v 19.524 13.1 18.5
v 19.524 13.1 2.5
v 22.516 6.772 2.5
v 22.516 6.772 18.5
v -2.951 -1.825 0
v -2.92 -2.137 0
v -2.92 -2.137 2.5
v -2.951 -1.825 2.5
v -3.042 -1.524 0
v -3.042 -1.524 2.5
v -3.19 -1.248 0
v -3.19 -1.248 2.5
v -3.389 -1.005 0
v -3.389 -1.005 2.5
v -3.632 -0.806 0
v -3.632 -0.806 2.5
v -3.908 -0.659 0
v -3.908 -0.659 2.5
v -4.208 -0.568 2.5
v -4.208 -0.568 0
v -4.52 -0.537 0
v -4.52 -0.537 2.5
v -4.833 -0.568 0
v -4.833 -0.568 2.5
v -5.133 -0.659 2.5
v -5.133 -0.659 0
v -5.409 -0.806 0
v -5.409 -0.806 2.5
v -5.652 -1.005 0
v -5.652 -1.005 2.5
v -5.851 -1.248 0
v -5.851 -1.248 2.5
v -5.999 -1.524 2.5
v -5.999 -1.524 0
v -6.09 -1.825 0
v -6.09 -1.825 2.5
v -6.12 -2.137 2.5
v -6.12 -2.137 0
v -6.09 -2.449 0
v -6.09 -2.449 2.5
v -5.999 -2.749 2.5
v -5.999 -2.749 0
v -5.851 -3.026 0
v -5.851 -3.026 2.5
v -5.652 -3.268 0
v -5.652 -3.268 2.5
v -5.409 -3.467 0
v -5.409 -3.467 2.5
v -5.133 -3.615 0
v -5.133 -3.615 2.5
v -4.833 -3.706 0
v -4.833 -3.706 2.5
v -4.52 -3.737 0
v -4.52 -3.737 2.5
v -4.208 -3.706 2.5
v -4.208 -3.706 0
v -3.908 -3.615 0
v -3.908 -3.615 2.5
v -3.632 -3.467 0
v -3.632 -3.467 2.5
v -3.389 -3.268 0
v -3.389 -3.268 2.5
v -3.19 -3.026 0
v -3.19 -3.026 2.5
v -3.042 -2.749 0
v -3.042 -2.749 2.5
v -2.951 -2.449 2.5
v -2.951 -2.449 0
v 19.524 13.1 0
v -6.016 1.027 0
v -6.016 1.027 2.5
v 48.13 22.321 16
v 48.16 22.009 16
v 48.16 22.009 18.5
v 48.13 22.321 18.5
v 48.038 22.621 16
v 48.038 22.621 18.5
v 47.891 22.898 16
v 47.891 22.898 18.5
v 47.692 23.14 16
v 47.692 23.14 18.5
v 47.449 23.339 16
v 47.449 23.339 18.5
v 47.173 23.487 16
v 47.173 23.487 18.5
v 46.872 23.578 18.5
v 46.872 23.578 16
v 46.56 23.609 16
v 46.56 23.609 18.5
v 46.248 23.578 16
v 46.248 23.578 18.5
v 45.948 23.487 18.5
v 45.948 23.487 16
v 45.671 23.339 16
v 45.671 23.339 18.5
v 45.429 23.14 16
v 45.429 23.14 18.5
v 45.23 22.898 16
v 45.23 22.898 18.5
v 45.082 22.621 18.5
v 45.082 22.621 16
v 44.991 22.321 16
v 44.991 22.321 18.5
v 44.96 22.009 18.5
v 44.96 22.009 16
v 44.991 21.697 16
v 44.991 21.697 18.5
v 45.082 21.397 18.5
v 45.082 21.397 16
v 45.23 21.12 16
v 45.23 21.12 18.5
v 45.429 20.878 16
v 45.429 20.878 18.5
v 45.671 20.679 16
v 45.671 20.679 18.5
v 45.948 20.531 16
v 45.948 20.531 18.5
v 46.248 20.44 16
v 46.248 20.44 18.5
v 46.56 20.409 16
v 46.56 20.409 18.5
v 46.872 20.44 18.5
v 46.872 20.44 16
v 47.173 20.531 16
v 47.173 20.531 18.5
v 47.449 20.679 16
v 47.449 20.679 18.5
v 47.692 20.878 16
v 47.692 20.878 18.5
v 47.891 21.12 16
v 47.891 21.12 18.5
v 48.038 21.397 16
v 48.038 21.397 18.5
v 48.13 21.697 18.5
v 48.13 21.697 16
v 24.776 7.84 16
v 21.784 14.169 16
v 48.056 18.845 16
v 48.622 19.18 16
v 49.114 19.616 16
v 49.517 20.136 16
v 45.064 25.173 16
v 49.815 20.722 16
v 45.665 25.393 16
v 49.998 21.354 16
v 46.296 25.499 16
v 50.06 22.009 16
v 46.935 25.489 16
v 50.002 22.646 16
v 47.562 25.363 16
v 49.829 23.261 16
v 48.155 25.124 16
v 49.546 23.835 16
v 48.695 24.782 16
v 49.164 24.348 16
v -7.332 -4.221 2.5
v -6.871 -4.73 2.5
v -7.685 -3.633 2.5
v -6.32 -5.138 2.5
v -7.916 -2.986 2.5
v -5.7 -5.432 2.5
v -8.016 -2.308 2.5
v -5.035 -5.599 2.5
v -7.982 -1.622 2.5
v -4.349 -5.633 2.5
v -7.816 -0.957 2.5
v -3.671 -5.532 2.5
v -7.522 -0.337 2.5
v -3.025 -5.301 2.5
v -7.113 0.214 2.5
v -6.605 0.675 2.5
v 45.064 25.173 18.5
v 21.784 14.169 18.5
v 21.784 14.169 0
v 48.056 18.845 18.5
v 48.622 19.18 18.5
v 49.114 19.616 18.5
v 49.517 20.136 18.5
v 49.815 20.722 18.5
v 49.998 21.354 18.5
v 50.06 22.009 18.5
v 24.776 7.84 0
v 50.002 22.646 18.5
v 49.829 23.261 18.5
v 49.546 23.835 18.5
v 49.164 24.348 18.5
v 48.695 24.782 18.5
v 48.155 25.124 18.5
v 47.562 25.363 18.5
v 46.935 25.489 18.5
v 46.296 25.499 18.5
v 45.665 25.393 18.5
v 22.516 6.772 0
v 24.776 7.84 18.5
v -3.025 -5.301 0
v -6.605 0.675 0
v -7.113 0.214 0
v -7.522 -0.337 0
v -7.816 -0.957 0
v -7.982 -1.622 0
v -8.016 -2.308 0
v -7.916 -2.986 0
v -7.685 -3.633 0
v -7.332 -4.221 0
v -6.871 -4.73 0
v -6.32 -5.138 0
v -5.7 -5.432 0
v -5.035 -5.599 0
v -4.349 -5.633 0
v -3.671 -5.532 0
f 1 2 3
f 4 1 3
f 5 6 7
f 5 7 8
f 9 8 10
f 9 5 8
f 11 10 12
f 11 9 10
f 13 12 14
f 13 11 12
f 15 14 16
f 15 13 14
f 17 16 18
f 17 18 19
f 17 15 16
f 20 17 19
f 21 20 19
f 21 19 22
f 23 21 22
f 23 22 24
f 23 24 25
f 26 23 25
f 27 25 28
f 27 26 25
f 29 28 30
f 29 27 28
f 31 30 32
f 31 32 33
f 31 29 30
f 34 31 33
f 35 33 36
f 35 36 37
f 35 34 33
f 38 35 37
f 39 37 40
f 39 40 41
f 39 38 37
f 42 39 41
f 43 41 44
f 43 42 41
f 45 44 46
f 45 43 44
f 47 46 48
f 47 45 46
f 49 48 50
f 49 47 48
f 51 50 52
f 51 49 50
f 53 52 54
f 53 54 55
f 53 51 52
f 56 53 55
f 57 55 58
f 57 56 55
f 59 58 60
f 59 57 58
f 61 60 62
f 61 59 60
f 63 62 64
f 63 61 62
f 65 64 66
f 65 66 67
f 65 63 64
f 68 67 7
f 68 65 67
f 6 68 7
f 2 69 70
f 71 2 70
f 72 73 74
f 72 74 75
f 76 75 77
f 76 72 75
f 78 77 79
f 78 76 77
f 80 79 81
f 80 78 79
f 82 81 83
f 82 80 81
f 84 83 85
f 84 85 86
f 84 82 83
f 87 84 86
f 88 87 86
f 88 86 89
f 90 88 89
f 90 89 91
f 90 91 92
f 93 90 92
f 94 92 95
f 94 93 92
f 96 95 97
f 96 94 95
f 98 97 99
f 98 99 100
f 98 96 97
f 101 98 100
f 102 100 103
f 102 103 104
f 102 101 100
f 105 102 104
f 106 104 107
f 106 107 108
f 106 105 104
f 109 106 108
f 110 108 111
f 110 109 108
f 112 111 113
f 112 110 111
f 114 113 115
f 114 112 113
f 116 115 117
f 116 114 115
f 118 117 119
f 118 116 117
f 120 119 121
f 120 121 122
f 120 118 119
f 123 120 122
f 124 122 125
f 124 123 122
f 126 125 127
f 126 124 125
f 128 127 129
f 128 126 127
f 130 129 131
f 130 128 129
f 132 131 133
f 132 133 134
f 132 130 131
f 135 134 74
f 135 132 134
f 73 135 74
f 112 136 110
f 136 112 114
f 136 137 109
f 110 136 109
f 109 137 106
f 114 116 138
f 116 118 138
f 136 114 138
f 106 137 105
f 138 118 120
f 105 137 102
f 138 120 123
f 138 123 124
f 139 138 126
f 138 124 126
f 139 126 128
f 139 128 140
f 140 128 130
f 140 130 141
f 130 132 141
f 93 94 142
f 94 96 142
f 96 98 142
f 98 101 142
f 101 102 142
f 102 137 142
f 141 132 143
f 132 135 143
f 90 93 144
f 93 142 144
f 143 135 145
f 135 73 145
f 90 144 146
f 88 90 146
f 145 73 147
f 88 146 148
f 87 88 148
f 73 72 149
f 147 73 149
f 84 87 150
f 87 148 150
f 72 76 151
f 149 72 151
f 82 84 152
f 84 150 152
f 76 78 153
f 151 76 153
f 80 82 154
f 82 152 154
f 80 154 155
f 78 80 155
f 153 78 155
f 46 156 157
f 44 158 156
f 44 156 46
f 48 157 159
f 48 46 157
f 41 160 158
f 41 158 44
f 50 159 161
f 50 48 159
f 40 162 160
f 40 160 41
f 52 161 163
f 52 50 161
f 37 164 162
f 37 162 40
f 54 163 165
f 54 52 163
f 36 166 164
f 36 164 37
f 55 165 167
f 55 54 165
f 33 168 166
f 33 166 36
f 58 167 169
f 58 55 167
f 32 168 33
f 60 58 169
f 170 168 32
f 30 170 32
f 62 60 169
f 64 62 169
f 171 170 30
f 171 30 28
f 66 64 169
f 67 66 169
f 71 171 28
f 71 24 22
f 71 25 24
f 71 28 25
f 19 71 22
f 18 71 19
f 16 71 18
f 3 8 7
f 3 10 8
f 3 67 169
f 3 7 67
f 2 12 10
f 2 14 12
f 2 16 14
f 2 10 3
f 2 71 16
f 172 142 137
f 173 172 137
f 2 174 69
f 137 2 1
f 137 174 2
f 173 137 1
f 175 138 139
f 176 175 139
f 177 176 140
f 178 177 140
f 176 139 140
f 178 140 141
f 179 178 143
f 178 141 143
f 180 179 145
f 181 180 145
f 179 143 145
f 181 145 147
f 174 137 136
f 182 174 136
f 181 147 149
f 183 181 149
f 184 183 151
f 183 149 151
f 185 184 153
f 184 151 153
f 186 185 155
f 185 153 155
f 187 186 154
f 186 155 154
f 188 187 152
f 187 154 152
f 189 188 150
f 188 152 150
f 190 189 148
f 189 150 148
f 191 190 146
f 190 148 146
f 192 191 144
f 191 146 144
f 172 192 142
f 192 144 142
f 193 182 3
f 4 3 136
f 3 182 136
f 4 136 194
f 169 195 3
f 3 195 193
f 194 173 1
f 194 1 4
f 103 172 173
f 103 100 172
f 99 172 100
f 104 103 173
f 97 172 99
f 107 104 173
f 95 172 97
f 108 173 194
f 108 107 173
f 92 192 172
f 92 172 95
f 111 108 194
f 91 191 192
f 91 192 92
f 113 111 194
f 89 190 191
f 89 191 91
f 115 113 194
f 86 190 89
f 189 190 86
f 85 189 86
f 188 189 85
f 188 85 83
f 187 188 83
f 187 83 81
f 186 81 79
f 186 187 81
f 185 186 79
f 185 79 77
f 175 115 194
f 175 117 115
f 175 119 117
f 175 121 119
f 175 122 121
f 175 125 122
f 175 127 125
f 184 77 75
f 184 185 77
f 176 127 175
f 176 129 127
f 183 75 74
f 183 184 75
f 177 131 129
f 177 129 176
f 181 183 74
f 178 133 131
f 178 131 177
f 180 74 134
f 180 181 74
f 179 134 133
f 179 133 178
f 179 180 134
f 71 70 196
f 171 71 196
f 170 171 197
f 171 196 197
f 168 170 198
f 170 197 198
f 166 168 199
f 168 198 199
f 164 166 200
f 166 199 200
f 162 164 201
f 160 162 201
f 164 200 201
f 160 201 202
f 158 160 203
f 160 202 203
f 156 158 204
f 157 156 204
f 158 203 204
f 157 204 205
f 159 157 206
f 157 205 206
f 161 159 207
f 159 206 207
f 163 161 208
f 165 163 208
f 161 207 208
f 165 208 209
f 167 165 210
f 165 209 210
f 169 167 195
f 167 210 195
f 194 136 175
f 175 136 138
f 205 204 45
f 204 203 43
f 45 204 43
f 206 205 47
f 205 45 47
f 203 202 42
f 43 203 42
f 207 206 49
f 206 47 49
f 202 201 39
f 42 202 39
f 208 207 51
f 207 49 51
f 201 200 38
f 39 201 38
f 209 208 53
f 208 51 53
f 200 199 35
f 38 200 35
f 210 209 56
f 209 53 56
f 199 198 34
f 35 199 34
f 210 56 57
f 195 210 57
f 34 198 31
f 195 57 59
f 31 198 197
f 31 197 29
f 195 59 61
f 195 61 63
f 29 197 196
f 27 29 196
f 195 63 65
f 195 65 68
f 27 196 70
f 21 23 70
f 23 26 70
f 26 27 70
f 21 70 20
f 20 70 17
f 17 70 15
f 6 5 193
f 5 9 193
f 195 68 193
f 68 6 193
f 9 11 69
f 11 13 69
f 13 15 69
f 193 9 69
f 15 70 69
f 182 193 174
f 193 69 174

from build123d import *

# Parameters (mm, degrees)
F1_R     = 1.6
F2_DEPTH = 2.5
F3_W     = 7
F3_H     = 18.5
F4_DEPTH = 2.5
F5_R     = 1.6
F6_DEPTH = 2.5


with BuildPart() as f2:
    # F1 (on offset) → F2 (new body)
    with BuildSketch(Plane.XY.offset(16)):
        with BuildLine():
            ThreePointArc((48.0560038294, 18.8446410406), (49.5170345112, 20.1361157487), (50.0602513075, 22.0089299644))
            ThreePointArc((50.0602513075, 22.0089299644), (48.4330655233, 24.9657131681), (45.0644987857, 25.1732188883))
            ThreePointArc((45.0644987857, 25.1732188883), (43.3959623837, 20.5131774426), (48.0560038294, 18.8446410406))
        make_face()
        with Locations((46.5602513075, 22.0089299644)):
            Circle(F1_R, mode=Mode.SUBTRACT)
        with BuildLine():
            ThreePointArc((48.0560038294, 18.8446410406), (43.3959623837, 20.5131774426), (45.0644987857, 25.1732188883))
            Line((45.0644987857, 25.1732188883), (21.7843731319, 14.168753906))
            Line((21.7843731319, 14.168753906), (24.7758781756, 7.8401760584))
            Line((24.7758781756, 7.8401760584), (48.0560038294, 18.8446410406))
        make_face()
    extrude(amount=F2_DEPTH)

    # F3 (on face) → F4 (join)
    with BuildSketch(Plane(origin=(23.2801256538, 11.0044649822, 0), x_dir=(0.4273578634, -0.9040825497, 0), z_dir=(-0.9040825497, -0.4273578634, 0))):
        with Locations((0, 9.25)):
            Rectangle(F3_W, F3_H)
    extrude(amount=F4_DEPTH)

    # F5 (on Top) → F6 (join)
    with BuildSketch(Plane.XY):
        with BuildLine():
            ThreePointArc((-3.0246602264, -5.3010782407), (-1.5636295447, -4.0096035327), (-1.0204127483, -2.1367893169))
            ThreePointArc((-1.0204127483, -2.1367893169), (-2.6475985325, 0.8199938867), (-6.0161652702, 1.0274996069))
            ThreePointArc((-6.0161652702, 1.0274996069), (-7.6847016721, -3.6325418388), (-3.0246602264, -5.3010782407))
        make_face()
        with Locations((-4.5204127483, -2.1367893169)):
            Circle(F5_R, mode=Mode.SUBTRACT)
        with BuildLine():
            ThreePointArc((-6.0161652702, 1.0274996069), (-2.6475985325, 0.8199938867), (-1.0204127483, -2.1367893169))
            ThreePointArc((-1.0204127483, -2.1367893169), (-1.5636295447, -4.0096035327), (-3.0246602264, -5.3010782407))
            Line((-3.0246602264, -5.3010782407), (22.5156718015, 6.7717813999))
            Line((22.5156718015, 6.7717813999), (19.5241667578, 13.1003592476))
            Line((19.5241667578, 13.1003592476), (-6.0161652702, 1.0274996069))
        make_face()
    extrude(amount=F6_DEPTH)


solid = f2.part
